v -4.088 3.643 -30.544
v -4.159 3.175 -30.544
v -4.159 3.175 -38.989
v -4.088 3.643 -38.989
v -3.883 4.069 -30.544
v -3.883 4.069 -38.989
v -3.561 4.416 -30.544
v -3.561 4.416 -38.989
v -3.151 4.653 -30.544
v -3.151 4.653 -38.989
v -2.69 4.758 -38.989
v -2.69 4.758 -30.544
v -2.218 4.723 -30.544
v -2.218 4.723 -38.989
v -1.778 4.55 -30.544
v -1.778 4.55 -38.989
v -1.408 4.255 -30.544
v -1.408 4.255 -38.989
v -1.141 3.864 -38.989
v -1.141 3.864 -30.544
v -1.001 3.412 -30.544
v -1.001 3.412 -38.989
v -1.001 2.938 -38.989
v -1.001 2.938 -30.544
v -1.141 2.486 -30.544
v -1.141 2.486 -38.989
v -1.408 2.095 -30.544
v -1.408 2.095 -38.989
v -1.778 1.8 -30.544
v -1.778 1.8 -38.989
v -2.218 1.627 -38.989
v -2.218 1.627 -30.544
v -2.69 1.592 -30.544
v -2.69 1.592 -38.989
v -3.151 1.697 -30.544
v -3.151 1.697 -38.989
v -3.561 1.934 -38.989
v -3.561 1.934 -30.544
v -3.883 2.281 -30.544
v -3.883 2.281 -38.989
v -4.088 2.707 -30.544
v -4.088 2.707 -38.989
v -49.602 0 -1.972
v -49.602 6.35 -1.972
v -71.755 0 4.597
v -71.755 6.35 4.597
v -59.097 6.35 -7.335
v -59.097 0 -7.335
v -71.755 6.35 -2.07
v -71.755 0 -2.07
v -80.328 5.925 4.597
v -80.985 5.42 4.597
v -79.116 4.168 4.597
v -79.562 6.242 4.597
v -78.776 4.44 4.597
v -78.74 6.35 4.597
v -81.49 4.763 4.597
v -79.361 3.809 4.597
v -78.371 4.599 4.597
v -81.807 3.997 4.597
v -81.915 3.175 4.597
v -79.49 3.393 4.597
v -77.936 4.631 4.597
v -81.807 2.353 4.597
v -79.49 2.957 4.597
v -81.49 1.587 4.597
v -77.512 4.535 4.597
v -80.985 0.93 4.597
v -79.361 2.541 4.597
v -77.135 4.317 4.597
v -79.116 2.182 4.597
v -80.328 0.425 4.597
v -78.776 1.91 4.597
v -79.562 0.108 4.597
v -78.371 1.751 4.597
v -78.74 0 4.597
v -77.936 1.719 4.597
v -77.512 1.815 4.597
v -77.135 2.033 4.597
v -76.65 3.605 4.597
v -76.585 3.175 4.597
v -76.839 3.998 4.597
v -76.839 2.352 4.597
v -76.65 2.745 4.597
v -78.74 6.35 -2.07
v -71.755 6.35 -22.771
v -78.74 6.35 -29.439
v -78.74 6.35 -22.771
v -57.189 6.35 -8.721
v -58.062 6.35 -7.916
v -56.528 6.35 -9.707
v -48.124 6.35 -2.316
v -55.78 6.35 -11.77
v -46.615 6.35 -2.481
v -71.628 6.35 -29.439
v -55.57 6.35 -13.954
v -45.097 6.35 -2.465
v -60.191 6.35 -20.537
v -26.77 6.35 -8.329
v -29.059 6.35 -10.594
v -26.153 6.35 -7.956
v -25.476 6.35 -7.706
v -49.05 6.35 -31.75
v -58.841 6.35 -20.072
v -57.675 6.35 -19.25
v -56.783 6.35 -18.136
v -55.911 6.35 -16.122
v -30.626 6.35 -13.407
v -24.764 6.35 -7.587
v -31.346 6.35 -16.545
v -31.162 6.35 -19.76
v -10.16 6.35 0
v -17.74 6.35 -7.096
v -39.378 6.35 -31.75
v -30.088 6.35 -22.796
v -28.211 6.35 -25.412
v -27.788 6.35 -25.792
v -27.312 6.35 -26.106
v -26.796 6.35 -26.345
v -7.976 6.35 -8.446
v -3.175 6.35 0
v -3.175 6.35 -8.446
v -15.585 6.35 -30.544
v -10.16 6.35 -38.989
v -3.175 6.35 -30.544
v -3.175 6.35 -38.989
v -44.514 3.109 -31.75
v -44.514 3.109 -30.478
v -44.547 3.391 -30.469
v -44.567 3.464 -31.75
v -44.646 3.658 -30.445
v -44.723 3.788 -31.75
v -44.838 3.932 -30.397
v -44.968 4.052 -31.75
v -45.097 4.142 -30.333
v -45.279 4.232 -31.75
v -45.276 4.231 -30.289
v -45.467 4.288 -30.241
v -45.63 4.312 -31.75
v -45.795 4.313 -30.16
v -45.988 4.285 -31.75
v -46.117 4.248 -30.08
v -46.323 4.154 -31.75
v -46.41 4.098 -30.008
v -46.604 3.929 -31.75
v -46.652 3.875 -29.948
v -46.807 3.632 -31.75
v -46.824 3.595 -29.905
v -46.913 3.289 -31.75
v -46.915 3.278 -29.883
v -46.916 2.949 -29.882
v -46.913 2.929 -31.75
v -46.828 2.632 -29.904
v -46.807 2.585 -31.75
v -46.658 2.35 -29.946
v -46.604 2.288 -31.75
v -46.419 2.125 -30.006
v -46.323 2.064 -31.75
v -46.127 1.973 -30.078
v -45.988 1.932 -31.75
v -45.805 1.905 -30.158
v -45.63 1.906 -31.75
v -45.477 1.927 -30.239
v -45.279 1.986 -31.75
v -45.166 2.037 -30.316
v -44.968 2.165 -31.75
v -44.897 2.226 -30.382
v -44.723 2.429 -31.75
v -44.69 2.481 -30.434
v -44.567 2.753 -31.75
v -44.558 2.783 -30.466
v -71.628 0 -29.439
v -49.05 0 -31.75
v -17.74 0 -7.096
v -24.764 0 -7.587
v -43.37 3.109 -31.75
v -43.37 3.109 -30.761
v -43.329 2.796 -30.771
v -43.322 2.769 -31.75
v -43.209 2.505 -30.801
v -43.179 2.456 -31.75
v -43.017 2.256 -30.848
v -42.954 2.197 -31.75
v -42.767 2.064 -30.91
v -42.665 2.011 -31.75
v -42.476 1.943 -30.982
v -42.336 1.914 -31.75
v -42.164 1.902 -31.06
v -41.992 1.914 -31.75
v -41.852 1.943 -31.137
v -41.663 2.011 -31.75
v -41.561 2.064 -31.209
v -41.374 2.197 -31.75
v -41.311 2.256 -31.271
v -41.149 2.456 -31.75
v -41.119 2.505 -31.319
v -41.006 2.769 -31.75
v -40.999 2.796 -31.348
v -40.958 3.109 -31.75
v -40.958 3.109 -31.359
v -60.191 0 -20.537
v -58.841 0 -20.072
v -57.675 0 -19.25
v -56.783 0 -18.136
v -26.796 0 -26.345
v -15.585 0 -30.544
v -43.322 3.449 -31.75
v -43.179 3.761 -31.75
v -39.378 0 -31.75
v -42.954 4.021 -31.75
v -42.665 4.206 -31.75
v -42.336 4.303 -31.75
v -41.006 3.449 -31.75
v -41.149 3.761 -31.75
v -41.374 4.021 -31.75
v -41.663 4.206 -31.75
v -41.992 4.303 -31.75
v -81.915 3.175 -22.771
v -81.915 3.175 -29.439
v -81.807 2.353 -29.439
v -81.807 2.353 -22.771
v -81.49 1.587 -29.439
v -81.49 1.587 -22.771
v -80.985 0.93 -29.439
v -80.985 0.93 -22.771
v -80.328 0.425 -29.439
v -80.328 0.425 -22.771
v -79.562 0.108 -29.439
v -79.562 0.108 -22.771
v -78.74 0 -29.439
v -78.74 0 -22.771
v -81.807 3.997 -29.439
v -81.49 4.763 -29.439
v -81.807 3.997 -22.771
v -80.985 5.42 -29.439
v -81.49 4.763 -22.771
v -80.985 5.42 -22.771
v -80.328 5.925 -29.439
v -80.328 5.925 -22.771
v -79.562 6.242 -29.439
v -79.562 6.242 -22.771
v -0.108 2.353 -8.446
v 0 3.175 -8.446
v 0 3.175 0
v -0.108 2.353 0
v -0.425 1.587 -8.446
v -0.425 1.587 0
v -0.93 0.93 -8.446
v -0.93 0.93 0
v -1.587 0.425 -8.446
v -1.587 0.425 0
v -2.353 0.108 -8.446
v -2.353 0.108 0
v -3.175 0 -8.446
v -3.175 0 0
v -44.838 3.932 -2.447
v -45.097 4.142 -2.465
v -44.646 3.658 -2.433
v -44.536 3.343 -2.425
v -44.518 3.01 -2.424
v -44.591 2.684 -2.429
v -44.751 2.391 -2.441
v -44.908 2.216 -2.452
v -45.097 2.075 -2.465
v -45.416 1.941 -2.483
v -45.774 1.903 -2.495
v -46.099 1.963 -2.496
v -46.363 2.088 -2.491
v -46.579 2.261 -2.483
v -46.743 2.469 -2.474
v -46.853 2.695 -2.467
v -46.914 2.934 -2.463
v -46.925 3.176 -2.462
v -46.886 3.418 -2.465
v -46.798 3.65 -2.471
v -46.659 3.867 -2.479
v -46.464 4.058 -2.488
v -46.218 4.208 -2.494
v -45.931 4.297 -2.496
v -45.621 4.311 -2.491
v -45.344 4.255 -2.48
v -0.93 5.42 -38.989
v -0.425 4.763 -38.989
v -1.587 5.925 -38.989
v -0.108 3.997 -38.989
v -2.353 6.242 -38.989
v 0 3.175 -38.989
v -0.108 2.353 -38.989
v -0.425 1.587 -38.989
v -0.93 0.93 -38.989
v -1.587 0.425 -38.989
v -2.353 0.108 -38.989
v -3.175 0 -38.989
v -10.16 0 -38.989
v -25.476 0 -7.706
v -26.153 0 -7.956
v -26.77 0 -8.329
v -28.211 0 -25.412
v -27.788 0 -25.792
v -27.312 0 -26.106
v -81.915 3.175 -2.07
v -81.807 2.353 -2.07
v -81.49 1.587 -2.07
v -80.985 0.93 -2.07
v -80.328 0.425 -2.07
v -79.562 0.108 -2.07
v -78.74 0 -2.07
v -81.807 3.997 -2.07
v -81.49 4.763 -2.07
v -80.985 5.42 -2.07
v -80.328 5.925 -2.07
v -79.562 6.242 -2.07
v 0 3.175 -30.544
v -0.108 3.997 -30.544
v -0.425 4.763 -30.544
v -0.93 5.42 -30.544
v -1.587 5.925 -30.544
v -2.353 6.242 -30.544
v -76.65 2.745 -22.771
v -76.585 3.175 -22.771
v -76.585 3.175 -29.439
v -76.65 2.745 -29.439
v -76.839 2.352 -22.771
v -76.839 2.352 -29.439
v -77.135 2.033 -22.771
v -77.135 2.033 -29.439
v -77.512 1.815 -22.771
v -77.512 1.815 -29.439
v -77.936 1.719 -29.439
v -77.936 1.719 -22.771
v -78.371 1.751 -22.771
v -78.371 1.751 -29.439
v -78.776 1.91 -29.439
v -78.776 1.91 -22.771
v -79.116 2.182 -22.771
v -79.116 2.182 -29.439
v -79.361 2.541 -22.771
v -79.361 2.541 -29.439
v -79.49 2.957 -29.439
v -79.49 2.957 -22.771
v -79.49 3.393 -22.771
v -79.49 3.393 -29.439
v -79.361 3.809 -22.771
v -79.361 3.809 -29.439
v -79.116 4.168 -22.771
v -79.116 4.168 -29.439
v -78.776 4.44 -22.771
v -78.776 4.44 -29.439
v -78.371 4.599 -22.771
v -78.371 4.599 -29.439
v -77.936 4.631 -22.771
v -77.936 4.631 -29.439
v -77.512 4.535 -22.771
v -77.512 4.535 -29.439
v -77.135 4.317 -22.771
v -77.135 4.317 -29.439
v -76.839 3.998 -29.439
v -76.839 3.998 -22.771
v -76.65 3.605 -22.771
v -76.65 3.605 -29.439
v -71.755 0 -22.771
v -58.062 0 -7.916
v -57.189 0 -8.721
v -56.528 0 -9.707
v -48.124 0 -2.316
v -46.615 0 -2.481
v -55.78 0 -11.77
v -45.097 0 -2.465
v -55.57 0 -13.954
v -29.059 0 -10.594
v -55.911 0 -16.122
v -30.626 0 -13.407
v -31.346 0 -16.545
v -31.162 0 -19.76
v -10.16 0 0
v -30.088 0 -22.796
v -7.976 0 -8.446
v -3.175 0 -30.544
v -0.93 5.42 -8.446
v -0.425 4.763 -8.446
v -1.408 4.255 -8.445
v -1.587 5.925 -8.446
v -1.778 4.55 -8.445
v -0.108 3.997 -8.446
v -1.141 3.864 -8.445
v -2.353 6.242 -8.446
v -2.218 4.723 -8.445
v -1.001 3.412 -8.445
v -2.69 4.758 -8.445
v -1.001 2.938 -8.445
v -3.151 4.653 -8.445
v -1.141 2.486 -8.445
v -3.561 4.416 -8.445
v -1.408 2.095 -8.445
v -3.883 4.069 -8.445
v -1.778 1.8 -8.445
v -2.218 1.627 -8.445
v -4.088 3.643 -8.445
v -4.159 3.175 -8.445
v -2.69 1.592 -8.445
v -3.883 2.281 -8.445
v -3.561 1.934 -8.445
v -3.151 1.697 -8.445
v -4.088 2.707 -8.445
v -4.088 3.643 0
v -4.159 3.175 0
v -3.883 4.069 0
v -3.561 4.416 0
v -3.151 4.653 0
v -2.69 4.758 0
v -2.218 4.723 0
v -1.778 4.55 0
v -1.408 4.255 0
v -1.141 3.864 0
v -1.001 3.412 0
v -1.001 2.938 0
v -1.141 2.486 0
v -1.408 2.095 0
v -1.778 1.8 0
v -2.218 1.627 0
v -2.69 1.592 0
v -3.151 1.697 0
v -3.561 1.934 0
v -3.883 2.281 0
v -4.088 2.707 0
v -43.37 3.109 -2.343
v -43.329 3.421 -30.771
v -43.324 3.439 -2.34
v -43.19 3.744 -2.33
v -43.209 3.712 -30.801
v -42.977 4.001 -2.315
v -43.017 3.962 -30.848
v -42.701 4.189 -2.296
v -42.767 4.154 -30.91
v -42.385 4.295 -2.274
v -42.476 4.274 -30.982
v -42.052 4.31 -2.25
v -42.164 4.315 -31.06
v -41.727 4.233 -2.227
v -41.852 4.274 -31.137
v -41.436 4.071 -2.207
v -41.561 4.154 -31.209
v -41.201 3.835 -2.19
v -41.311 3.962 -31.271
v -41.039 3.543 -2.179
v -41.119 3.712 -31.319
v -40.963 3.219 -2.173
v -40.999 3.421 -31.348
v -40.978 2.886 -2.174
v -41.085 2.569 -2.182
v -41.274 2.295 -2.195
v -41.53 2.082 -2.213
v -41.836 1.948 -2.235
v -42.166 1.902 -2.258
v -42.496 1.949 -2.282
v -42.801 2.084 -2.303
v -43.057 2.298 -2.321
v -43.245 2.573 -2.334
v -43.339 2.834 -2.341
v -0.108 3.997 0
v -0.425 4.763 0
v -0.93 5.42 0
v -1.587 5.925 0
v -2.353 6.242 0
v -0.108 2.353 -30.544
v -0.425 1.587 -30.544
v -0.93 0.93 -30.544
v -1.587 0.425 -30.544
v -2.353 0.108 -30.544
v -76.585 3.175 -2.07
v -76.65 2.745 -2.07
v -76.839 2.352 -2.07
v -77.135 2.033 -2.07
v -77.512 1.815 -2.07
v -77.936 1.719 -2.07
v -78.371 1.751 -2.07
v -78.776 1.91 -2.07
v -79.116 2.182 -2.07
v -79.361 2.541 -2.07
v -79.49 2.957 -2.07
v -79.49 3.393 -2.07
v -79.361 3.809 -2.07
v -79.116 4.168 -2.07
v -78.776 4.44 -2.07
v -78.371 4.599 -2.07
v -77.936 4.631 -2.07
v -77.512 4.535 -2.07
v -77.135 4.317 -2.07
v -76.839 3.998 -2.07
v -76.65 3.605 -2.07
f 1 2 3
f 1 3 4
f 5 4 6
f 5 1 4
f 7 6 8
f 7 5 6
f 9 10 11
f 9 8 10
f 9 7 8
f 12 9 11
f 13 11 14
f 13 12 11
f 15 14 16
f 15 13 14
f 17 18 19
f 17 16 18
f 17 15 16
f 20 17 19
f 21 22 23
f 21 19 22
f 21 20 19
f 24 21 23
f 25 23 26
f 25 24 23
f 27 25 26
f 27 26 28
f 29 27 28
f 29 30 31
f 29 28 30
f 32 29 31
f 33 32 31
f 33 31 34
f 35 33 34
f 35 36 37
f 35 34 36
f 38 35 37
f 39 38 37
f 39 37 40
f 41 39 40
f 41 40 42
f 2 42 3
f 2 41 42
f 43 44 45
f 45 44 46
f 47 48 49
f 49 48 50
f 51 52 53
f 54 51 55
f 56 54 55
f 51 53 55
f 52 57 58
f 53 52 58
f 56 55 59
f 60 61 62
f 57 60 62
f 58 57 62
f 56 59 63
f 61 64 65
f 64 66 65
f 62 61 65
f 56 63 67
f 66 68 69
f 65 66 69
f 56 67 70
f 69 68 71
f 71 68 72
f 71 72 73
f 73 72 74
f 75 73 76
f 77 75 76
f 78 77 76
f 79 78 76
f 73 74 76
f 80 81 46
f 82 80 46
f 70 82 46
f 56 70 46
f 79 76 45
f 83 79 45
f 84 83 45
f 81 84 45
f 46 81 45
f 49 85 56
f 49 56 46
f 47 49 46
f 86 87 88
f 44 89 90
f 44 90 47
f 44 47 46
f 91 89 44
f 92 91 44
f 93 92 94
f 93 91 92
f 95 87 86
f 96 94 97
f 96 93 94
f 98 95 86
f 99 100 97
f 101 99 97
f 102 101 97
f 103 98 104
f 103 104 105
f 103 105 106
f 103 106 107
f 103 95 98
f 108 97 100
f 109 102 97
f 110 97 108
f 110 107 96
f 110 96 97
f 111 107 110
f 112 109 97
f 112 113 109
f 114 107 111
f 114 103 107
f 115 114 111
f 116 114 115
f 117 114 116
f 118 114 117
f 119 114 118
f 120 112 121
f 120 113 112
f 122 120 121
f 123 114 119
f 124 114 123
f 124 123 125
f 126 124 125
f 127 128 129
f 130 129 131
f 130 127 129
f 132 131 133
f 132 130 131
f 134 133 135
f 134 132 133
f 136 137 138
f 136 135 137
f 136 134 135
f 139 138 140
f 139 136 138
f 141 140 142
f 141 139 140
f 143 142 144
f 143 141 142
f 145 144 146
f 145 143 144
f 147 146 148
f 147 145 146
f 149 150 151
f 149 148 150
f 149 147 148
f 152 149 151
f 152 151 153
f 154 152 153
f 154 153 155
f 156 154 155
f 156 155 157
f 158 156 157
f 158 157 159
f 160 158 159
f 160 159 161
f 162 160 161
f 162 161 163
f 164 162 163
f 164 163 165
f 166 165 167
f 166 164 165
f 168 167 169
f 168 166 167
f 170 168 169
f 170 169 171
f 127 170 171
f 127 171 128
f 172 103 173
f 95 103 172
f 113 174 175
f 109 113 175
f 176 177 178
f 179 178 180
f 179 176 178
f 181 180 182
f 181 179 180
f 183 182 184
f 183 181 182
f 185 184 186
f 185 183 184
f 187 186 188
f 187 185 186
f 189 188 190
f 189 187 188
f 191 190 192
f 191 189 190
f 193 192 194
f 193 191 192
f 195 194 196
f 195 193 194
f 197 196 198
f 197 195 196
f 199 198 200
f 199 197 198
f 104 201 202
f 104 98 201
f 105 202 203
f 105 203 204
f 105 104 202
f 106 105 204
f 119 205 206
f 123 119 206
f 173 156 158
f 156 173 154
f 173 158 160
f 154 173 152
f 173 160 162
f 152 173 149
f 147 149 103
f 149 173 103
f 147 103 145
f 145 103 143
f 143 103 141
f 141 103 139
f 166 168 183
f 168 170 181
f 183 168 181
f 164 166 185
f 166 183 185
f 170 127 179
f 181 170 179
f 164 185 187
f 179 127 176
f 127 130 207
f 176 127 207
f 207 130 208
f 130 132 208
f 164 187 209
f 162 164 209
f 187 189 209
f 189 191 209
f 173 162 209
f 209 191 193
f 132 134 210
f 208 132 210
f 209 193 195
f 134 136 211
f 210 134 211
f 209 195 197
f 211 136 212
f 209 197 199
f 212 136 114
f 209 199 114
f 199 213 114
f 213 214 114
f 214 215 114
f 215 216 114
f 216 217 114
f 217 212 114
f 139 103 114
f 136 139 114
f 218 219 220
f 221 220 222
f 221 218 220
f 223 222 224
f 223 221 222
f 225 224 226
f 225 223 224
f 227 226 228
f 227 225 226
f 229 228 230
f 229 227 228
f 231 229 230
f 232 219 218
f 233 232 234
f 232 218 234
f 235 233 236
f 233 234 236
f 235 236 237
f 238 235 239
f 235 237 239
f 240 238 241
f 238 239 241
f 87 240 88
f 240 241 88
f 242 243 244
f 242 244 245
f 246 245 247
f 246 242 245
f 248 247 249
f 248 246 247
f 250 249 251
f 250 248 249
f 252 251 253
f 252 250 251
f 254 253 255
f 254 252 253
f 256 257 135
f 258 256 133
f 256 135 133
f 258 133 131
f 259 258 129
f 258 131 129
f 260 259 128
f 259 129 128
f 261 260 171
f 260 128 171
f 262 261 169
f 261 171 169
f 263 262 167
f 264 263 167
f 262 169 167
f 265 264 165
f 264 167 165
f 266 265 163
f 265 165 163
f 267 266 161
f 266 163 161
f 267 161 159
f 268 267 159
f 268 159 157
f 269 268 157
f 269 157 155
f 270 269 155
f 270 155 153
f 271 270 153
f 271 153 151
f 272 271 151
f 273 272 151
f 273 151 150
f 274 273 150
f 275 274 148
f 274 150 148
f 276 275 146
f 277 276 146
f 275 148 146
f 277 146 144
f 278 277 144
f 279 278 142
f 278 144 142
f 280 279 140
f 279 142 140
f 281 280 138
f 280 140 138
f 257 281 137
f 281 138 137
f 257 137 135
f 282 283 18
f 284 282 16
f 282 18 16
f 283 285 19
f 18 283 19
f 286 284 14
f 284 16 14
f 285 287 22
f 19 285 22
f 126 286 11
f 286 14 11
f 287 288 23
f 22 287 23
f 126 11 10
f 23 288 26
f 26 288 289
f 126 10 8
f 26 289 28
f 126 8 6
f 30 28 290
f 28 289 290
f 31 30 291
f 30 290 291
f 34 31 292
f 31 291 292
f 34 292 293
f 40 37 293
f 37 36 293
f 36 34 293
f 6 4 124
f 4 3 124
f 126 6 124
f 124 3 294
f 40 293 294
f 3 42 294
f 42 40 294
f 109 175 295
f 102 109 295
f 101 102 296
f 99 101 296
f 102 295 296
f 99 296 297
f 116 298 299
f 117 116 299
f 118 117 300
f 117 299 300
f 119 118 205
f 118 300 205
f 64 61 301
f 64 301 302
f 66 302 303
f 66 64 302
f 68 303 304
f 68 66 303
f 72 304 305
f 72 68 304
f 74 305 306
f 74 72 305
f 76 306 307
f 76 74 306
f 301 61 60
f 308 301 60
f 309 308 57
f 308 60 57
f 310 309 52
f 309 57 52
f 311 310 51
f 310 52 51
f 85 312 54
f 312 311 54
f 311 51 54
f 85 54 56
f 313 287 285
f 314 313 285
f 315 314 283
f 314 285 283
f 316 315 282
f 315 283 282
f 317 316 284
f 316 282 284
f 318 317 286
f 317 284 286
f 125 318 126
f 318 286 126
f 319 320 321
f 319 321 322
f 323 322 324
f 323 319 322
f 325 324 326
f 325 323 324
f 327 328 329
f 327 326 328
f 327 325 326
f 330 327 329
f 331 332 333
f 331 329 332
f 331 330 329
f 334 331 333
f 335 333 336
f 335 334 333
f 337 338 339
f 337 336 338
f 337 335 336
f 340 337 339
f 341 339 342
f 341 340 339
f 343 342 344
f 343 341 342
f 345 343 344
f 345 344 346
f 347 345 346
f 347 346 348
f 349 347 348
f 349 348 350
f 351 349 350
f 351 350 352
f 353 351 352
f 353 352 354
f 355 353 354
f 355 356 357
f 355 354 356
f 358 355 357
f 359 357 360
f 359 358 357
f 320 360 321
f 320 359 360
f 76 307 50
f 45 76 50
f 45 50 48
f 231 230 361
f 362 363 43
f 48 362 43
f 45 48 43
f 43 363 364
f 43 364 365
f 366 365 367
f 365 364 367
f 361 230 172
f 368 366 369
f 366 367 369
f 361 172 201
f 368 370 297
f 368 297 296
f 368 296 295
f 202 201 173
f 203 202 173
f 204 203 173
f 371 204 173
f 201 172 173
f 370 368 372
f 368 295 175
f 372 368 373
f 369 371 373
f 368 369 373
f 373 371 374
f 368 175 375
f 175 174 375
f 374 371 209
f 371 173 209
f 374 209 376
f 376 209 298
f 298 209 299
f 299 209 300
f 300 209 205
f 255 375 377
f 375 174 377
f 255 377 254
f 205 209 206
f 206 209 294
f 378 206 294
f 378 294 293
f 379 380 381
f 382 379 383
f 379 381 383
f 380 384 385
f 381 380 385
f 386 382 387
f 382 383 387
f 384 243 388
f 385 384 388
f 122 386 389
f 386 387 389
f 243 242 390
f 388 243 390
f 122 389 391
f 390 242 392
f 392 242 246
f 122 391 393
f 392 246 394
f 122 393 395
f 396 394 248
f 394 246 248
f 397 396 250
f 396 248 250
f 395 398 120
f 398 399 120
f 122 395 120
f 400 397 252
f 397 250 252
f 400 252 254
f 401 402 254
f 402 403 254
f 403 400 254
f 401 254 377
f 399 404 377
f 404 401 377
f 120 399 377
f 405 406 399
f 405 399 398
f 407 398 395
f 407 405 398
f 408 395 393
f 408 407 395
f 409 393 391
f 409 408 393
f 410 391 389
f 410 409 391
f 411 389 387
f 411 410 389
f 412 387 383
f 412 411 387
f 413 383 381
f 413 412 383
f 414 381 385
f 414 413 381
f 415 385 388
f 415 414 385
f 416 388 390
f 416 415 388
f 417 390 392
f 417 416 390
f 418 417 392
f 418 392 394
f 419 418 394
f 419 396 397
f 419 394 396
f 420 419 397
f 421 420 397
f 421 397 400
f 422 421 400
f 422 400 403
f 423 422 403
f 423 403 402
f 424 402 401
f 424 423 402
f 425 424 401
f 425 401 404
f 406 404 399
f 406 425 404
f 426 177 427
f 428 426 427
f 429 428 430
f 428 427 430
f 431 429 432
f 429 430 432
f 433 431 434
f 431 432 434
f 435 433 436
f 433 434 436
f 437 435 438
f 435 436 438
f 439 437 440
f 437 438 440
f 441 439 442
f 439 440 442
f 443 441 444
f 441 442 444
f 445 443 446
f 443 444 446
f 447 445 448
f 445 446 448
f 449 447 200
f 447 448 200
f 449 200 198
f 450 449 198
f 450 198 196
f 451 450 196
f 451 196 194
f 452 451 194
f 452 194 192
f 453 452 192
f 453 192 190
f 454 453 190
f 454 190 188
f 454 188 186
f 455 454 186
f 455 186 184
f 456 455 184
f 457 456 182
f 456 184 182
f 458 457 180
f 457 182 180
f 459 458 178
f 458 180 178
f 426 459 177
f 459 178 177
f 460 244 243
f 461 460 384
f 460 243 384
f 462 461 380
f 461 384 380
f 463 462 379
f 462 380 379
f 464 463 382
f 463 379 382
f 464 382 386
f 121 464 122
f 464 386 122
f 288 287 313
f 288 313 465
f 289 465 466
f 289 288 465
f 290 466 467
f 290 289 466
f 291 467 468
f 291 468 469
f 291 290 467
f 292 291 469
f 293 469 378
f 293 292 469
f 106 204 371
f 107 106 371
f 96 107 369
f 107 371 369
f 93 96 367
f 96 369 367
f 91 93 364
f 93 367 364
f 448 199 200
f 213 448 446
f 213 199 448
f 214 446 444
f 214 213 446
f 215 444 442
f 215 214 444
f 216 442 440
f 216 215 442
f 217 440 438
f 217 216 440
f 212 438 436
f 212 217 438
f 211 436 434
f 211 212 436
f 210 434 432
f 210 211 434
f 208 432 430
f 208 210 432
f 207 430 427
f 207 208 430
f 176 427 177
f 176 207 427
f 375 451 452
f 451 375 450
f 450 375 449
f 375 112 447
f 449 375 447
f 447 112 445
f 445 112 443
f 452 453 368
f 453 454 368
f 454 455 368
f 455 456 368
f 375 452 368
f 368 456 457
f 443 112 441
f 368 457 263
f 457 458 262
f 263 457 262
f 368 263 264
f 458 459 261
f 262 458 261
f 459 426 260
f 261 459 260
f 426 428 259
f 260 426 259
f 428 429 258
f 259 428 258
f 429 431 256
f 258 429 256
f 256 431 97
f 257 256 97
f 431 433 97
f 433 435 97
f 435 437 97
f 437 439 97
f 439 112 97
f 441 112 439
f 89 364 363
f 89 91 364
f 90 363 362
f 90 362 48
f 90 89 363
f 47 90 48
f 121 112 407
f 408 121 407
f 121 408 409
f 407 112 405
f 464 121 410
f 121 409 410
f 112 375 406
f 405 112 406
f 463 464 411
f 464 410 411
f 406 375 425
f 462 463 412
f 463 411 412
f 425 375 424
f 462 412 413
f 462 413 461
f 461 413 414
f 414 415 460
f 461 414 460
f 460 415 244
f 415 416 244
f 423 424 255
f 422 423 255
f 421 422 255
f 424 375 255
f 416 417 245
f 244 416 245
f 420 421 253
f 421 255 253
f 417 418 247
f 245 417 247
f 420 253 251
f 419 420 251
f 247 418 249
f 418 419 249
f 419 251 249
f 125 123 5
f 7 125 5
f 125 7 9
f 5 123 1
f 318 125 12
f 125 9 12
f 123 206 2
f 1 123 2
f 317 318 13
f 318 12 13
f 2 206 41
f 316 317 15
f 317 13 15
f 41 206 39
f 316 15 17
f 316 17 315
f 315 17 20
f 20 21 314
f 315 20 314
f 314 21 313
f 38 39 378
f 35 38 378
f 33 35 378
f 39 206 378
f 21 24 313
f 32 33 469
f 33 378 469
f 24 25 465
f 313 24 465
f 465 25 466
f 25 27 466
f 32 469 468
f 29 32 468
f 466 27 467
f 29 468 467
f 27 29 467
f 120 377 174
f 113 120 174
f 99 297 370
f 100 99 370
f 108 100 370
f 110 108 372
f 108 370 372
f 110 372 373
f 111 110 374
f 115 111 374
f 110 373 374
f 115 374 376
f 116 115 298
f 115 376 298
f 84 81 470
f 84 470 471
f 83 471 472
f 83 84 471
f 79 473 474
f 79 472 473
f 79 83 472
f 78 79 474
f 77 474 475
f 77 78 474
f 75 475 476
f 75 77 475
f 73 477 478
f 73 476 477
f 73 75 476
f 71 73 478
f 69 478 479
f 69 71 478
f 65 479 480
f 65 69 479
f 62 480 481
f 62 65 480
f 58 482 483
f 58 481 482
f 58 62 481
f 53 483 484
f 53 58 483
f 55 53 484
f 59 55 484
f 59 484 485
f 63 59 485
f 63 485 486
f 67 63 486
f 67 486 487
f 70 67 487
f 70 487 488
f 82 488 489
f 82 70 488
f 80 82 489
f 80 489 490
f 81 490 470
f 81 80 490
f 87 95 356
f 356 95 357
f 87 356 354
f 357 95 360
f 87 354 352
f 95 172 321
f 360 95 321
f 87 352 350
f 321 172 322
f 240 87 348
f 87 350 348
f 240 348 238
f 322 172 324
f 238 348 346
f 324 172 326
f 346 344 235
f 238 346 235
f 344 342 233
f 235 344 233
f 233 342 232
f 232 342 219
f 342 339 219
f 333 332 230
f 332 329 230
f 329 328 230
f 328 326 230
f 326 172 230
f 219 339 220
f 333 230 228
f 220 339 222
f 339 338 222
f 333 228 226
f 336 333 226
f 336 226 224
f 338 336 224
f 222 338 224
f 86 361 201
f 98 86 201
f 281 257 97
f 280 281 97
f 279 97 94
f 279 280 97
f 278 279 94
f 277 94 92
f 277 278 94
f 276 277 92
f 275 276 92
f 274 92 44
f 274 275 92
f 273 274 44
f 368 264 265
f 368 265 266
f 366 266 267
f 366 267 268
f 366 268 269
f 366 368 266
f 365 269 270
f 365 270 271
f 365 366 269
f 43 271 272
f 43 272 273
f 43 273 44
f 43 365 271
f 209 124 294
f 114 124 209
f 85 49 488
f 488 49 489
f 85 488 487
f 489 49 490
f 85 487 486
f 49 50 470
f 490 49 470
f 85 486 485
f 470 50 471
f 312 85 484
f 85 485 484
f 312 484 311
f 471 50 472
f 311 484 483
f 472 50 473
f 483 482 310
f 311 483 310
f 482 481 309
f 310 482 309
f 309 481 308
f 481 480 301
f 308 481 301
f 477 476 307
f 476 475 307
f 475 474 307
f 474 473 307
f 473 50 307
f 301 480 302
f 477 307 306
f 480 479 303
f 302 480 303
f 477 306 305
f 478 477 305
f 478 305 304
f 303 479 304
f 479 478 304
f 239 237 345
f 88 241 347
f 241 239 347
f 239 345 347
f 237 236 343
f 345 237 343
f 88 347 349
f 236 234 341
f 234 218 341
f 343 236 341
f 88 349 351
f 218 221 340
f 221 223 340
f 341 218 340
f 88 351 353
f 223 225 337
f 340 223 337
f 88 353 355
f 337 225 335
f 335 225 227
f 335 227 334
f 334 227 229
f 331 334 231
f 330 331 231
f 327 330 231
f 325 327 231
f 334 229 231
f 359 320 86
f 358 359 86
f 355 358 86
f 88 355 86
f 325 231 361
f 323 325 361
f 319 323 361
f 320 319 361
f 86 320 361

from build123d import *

# Parameters (mm, degrees)
BOSS_EXTRUDE1_DEPTH     = 6.35
FILLET2_R               = 3.175
CUT_EXTRUDE2_DEPTH      = 91.397918676
CUT_EXTRUDE2_DEPTH_BACK = 91.397918676
SKETCH2_R               = 1.5875
SKETCH2_R_2             = 1.4605
CUT_EXTRUDE5_DEPTH      = 91.942464482
CUT_EXTRUDE7_DEPTH      = 25.4
SKETCH6_W               = 10.4785697
SKETCH6_H               = 6.35
SKETCH6_R               = 1.2065
BOSS_EXTRUDE2_DEPTH     = 12.7
FILLET5_R               = 12.7
FILLET6_R               = 5.08
BOSS_EXTRUDE3_DEPTH     = 6.35
SKETCH10_R              = 1.2065
CUT_EXTRUDE9_DEPTH      = 90.841656328


with BuildPart() as part:
    # Sketch1 → Boss-Extrude1 (new body)
    with BuildSketch(Plane(origin=(0, 0, 0), x_dir=(1, 0, 0), z_dir=(0, 1, 0))):
        Polygon((0, 0), (0, 38.989), (-10.16, 38.989), (-71.628, 29.4386), (-81.915, 29.4386), (-81.915, -4.5974), (-71.755, -4.5974), (-10.16, 0), align=None)
    extrude(amount=BOSS_EXTRUDE1_DEPTH)

    # Fillet2
    fillet2_edges = [part.edges().sort_by_distance(p)[0] for p in [
        (0, 0, -19.4945),
        (0, 6.35, -19.4945),
        (-81.915, 0, -12.4206),
        (-81.915, 6.35, -12.4206),
    ]]
    fillet(fillet2_edges, radius=FILLET2_R - 0.0001)  # a hair under: the kernel refuses the full size

    # Sketch2 → Cut-Extrude2 (cut, two sides: drawn at the far end of the back side and taken through both)
    with BuildSketch(Plane(origin=(-0.604981675, 0, 0), x_dir=(-1, 0, 0), z_dir=(0, 0, -1)).offset(-CUT_EXTRUDE2_DEPTH_BACK)):
        with Locations((1.966275702, 3.175)):
            Circle(SKETCH2_R)
        with Locations(Location((77.44064574, 3.175, 0), (0, 0, 180))):
            Circle(SKETCH2_R_2)
    extrude(amount=CUT_EXTRUDE2_DEPTH + CUT_EXTRUDE2_DEPTH_BACK, mode=Mode.SUBTRACT)

    # Sketch3 → Cut-Extrude5 (cut, through all)
    with BuildSketch(Plane(origin=(0, 0, 0), x_dir=(1, 0, 0), z_dir=(0, 1, 0))):
        with BuildLine():
            Line((-81.915, 22.7711), (-71.755, 22.7711))
            Line((-71.755, 22.7711), (-58.487579402, 20.207642468))
            ThreePointArc((-58.487579402, 20.207642468), (-55.580114305, 14.192748547), (-57.777398298, 7.883687982))
            Line((-57.777398298, 7.883687982), (-71.755, 2.0701))
            Line((-71.755, 2.0701), (-81.915, 2.0701))
            Line((-81.915, 2.0701), (-81.915, 22.7711))
        make_face()
        with BuildLine():
            Line((0, 30.5435), (0, 8.4455))
            Line((0, 8.4455), (-7.9756, 8.4455))
            Line((-7.9756, 8.4455), (-17.739567161, 7.096263095))
            Line((-17.739567161, 7.096263095), (-24.764375431, 7.587485542))
            ThreePointArc((-24.764375431, 7.587485542), (-25.820245836, 7.814780317), (-26.769908004, 8.32923828))
            ThreePointArc((-26.769908004, 8.32923828), (-31.345543526, 16.545378703), (-28.210906636, 25.41191441))
            ThreePointArc((-28.210906636, 25.41191441), (-27.55579932, 25.957953915), (-26.795645997, 26.34459543))
            Line((-26.795645997, 26.34459543), (-15.585156538, 30.5435))
            Line((-15.585156538, 30.5435), (-7.9756, 30.5435))
            Line((-7.9756, 30.5435), (0, 30.5435))
        make_face()
    extrude(amount=CUT_EXTRUDE5_DEPTH, mode=Mode.SUBTRACT)

    # Sketch5 → Cut-Extrude7 (cut)
    with BuildSketch(Plane(origin=(0, 6.35, 0), x_dir=(1, 0, 0), z_dir=(0, 1, 0))):
        Polygon((-10.16, 38.989), (-53.78735915, 28.179846815), (-71.628, 29.4386), align=None)
        Polygon((-10.16, 0), (-47.394119509, 2.627067431), (-71.755, -4.5974), align=None)
    extrude(amount=-CUT_EXTRUDE7_DEPTH, mode=Mode.SUBTRACT)

    # Sketch6 → Boss-Extrude2 (add)
    with BuildSketch(Plane.XY.offset(-31.75)):
        with Locations((-43.810886798, 3.175)):
            Rectangle(SKETCH6_W, SKETCH6_H)
        with Locations((-45.72, 3.108706623)):
            Circle(SKETCH6_R, mode=Mode.SUBTRACT)
        with Locations((-42.164, 3.108706623)):
            Circle(SKETCH6_R, mode=Mode.SUBTRACT)
    extrude(amount=BOSS_EXTRUDE2_DEPTH)

    # Fillet5
    fillet5_edges = [part.edges().sort_by_distance(p)[0] for p in [
        (-53.78735915, 3.175, -28.179846815),
        (-47.394119509, 3.175, -2.627067431),
    ]]
    fillet(fillet5_edges, radius=FILLET5_R)

    # Fillet6
    fillet6_edges = [part.edges().sort_by_distance(p)[0] for p in [
        (-57.777398298, 3.175, -7.883687982),
        (-58.487579402, 3.175, -20.207642468),
    ]]
    fillet(fillet6_edges, radius=FILLET6_R)

    # Sketch9 → Boss-Extrude3 (add)
    with BuildSketch(Plane(origin=(0, 6.35, 0), x_dir=(1, 0, 0), z_dir=(0, 1, 0))):
        Polygon((-49.050171648, 31.75), (-71.628, 29.4386), (-71.628, 26.697361781), (-49.050171648, 26.697361781), align=None)
    extrude(amount=-BOSS_EXTRUDE3_DEPTH)

    # Sketch10 → Cut-Extrude9 (cut, through all)
    with BuildSketch(Plane(origin=(0, 0, -31.75), x_dir=(-1, 0, 0), z_dir=(0, 0, -1))):
        with Locations((42.164, 3.108706623)):
            Circle(SKETCH10_R)
        with Locations(Location((45.72, 3.108706623, 0), (0, 0, 121.083308631))):
            Circle(SKETCH10_R)
    extrude(amount=-CUT_EXTRUDE9_DEPTH, mode=Mode.SUBTRACT)


solid = part.part
